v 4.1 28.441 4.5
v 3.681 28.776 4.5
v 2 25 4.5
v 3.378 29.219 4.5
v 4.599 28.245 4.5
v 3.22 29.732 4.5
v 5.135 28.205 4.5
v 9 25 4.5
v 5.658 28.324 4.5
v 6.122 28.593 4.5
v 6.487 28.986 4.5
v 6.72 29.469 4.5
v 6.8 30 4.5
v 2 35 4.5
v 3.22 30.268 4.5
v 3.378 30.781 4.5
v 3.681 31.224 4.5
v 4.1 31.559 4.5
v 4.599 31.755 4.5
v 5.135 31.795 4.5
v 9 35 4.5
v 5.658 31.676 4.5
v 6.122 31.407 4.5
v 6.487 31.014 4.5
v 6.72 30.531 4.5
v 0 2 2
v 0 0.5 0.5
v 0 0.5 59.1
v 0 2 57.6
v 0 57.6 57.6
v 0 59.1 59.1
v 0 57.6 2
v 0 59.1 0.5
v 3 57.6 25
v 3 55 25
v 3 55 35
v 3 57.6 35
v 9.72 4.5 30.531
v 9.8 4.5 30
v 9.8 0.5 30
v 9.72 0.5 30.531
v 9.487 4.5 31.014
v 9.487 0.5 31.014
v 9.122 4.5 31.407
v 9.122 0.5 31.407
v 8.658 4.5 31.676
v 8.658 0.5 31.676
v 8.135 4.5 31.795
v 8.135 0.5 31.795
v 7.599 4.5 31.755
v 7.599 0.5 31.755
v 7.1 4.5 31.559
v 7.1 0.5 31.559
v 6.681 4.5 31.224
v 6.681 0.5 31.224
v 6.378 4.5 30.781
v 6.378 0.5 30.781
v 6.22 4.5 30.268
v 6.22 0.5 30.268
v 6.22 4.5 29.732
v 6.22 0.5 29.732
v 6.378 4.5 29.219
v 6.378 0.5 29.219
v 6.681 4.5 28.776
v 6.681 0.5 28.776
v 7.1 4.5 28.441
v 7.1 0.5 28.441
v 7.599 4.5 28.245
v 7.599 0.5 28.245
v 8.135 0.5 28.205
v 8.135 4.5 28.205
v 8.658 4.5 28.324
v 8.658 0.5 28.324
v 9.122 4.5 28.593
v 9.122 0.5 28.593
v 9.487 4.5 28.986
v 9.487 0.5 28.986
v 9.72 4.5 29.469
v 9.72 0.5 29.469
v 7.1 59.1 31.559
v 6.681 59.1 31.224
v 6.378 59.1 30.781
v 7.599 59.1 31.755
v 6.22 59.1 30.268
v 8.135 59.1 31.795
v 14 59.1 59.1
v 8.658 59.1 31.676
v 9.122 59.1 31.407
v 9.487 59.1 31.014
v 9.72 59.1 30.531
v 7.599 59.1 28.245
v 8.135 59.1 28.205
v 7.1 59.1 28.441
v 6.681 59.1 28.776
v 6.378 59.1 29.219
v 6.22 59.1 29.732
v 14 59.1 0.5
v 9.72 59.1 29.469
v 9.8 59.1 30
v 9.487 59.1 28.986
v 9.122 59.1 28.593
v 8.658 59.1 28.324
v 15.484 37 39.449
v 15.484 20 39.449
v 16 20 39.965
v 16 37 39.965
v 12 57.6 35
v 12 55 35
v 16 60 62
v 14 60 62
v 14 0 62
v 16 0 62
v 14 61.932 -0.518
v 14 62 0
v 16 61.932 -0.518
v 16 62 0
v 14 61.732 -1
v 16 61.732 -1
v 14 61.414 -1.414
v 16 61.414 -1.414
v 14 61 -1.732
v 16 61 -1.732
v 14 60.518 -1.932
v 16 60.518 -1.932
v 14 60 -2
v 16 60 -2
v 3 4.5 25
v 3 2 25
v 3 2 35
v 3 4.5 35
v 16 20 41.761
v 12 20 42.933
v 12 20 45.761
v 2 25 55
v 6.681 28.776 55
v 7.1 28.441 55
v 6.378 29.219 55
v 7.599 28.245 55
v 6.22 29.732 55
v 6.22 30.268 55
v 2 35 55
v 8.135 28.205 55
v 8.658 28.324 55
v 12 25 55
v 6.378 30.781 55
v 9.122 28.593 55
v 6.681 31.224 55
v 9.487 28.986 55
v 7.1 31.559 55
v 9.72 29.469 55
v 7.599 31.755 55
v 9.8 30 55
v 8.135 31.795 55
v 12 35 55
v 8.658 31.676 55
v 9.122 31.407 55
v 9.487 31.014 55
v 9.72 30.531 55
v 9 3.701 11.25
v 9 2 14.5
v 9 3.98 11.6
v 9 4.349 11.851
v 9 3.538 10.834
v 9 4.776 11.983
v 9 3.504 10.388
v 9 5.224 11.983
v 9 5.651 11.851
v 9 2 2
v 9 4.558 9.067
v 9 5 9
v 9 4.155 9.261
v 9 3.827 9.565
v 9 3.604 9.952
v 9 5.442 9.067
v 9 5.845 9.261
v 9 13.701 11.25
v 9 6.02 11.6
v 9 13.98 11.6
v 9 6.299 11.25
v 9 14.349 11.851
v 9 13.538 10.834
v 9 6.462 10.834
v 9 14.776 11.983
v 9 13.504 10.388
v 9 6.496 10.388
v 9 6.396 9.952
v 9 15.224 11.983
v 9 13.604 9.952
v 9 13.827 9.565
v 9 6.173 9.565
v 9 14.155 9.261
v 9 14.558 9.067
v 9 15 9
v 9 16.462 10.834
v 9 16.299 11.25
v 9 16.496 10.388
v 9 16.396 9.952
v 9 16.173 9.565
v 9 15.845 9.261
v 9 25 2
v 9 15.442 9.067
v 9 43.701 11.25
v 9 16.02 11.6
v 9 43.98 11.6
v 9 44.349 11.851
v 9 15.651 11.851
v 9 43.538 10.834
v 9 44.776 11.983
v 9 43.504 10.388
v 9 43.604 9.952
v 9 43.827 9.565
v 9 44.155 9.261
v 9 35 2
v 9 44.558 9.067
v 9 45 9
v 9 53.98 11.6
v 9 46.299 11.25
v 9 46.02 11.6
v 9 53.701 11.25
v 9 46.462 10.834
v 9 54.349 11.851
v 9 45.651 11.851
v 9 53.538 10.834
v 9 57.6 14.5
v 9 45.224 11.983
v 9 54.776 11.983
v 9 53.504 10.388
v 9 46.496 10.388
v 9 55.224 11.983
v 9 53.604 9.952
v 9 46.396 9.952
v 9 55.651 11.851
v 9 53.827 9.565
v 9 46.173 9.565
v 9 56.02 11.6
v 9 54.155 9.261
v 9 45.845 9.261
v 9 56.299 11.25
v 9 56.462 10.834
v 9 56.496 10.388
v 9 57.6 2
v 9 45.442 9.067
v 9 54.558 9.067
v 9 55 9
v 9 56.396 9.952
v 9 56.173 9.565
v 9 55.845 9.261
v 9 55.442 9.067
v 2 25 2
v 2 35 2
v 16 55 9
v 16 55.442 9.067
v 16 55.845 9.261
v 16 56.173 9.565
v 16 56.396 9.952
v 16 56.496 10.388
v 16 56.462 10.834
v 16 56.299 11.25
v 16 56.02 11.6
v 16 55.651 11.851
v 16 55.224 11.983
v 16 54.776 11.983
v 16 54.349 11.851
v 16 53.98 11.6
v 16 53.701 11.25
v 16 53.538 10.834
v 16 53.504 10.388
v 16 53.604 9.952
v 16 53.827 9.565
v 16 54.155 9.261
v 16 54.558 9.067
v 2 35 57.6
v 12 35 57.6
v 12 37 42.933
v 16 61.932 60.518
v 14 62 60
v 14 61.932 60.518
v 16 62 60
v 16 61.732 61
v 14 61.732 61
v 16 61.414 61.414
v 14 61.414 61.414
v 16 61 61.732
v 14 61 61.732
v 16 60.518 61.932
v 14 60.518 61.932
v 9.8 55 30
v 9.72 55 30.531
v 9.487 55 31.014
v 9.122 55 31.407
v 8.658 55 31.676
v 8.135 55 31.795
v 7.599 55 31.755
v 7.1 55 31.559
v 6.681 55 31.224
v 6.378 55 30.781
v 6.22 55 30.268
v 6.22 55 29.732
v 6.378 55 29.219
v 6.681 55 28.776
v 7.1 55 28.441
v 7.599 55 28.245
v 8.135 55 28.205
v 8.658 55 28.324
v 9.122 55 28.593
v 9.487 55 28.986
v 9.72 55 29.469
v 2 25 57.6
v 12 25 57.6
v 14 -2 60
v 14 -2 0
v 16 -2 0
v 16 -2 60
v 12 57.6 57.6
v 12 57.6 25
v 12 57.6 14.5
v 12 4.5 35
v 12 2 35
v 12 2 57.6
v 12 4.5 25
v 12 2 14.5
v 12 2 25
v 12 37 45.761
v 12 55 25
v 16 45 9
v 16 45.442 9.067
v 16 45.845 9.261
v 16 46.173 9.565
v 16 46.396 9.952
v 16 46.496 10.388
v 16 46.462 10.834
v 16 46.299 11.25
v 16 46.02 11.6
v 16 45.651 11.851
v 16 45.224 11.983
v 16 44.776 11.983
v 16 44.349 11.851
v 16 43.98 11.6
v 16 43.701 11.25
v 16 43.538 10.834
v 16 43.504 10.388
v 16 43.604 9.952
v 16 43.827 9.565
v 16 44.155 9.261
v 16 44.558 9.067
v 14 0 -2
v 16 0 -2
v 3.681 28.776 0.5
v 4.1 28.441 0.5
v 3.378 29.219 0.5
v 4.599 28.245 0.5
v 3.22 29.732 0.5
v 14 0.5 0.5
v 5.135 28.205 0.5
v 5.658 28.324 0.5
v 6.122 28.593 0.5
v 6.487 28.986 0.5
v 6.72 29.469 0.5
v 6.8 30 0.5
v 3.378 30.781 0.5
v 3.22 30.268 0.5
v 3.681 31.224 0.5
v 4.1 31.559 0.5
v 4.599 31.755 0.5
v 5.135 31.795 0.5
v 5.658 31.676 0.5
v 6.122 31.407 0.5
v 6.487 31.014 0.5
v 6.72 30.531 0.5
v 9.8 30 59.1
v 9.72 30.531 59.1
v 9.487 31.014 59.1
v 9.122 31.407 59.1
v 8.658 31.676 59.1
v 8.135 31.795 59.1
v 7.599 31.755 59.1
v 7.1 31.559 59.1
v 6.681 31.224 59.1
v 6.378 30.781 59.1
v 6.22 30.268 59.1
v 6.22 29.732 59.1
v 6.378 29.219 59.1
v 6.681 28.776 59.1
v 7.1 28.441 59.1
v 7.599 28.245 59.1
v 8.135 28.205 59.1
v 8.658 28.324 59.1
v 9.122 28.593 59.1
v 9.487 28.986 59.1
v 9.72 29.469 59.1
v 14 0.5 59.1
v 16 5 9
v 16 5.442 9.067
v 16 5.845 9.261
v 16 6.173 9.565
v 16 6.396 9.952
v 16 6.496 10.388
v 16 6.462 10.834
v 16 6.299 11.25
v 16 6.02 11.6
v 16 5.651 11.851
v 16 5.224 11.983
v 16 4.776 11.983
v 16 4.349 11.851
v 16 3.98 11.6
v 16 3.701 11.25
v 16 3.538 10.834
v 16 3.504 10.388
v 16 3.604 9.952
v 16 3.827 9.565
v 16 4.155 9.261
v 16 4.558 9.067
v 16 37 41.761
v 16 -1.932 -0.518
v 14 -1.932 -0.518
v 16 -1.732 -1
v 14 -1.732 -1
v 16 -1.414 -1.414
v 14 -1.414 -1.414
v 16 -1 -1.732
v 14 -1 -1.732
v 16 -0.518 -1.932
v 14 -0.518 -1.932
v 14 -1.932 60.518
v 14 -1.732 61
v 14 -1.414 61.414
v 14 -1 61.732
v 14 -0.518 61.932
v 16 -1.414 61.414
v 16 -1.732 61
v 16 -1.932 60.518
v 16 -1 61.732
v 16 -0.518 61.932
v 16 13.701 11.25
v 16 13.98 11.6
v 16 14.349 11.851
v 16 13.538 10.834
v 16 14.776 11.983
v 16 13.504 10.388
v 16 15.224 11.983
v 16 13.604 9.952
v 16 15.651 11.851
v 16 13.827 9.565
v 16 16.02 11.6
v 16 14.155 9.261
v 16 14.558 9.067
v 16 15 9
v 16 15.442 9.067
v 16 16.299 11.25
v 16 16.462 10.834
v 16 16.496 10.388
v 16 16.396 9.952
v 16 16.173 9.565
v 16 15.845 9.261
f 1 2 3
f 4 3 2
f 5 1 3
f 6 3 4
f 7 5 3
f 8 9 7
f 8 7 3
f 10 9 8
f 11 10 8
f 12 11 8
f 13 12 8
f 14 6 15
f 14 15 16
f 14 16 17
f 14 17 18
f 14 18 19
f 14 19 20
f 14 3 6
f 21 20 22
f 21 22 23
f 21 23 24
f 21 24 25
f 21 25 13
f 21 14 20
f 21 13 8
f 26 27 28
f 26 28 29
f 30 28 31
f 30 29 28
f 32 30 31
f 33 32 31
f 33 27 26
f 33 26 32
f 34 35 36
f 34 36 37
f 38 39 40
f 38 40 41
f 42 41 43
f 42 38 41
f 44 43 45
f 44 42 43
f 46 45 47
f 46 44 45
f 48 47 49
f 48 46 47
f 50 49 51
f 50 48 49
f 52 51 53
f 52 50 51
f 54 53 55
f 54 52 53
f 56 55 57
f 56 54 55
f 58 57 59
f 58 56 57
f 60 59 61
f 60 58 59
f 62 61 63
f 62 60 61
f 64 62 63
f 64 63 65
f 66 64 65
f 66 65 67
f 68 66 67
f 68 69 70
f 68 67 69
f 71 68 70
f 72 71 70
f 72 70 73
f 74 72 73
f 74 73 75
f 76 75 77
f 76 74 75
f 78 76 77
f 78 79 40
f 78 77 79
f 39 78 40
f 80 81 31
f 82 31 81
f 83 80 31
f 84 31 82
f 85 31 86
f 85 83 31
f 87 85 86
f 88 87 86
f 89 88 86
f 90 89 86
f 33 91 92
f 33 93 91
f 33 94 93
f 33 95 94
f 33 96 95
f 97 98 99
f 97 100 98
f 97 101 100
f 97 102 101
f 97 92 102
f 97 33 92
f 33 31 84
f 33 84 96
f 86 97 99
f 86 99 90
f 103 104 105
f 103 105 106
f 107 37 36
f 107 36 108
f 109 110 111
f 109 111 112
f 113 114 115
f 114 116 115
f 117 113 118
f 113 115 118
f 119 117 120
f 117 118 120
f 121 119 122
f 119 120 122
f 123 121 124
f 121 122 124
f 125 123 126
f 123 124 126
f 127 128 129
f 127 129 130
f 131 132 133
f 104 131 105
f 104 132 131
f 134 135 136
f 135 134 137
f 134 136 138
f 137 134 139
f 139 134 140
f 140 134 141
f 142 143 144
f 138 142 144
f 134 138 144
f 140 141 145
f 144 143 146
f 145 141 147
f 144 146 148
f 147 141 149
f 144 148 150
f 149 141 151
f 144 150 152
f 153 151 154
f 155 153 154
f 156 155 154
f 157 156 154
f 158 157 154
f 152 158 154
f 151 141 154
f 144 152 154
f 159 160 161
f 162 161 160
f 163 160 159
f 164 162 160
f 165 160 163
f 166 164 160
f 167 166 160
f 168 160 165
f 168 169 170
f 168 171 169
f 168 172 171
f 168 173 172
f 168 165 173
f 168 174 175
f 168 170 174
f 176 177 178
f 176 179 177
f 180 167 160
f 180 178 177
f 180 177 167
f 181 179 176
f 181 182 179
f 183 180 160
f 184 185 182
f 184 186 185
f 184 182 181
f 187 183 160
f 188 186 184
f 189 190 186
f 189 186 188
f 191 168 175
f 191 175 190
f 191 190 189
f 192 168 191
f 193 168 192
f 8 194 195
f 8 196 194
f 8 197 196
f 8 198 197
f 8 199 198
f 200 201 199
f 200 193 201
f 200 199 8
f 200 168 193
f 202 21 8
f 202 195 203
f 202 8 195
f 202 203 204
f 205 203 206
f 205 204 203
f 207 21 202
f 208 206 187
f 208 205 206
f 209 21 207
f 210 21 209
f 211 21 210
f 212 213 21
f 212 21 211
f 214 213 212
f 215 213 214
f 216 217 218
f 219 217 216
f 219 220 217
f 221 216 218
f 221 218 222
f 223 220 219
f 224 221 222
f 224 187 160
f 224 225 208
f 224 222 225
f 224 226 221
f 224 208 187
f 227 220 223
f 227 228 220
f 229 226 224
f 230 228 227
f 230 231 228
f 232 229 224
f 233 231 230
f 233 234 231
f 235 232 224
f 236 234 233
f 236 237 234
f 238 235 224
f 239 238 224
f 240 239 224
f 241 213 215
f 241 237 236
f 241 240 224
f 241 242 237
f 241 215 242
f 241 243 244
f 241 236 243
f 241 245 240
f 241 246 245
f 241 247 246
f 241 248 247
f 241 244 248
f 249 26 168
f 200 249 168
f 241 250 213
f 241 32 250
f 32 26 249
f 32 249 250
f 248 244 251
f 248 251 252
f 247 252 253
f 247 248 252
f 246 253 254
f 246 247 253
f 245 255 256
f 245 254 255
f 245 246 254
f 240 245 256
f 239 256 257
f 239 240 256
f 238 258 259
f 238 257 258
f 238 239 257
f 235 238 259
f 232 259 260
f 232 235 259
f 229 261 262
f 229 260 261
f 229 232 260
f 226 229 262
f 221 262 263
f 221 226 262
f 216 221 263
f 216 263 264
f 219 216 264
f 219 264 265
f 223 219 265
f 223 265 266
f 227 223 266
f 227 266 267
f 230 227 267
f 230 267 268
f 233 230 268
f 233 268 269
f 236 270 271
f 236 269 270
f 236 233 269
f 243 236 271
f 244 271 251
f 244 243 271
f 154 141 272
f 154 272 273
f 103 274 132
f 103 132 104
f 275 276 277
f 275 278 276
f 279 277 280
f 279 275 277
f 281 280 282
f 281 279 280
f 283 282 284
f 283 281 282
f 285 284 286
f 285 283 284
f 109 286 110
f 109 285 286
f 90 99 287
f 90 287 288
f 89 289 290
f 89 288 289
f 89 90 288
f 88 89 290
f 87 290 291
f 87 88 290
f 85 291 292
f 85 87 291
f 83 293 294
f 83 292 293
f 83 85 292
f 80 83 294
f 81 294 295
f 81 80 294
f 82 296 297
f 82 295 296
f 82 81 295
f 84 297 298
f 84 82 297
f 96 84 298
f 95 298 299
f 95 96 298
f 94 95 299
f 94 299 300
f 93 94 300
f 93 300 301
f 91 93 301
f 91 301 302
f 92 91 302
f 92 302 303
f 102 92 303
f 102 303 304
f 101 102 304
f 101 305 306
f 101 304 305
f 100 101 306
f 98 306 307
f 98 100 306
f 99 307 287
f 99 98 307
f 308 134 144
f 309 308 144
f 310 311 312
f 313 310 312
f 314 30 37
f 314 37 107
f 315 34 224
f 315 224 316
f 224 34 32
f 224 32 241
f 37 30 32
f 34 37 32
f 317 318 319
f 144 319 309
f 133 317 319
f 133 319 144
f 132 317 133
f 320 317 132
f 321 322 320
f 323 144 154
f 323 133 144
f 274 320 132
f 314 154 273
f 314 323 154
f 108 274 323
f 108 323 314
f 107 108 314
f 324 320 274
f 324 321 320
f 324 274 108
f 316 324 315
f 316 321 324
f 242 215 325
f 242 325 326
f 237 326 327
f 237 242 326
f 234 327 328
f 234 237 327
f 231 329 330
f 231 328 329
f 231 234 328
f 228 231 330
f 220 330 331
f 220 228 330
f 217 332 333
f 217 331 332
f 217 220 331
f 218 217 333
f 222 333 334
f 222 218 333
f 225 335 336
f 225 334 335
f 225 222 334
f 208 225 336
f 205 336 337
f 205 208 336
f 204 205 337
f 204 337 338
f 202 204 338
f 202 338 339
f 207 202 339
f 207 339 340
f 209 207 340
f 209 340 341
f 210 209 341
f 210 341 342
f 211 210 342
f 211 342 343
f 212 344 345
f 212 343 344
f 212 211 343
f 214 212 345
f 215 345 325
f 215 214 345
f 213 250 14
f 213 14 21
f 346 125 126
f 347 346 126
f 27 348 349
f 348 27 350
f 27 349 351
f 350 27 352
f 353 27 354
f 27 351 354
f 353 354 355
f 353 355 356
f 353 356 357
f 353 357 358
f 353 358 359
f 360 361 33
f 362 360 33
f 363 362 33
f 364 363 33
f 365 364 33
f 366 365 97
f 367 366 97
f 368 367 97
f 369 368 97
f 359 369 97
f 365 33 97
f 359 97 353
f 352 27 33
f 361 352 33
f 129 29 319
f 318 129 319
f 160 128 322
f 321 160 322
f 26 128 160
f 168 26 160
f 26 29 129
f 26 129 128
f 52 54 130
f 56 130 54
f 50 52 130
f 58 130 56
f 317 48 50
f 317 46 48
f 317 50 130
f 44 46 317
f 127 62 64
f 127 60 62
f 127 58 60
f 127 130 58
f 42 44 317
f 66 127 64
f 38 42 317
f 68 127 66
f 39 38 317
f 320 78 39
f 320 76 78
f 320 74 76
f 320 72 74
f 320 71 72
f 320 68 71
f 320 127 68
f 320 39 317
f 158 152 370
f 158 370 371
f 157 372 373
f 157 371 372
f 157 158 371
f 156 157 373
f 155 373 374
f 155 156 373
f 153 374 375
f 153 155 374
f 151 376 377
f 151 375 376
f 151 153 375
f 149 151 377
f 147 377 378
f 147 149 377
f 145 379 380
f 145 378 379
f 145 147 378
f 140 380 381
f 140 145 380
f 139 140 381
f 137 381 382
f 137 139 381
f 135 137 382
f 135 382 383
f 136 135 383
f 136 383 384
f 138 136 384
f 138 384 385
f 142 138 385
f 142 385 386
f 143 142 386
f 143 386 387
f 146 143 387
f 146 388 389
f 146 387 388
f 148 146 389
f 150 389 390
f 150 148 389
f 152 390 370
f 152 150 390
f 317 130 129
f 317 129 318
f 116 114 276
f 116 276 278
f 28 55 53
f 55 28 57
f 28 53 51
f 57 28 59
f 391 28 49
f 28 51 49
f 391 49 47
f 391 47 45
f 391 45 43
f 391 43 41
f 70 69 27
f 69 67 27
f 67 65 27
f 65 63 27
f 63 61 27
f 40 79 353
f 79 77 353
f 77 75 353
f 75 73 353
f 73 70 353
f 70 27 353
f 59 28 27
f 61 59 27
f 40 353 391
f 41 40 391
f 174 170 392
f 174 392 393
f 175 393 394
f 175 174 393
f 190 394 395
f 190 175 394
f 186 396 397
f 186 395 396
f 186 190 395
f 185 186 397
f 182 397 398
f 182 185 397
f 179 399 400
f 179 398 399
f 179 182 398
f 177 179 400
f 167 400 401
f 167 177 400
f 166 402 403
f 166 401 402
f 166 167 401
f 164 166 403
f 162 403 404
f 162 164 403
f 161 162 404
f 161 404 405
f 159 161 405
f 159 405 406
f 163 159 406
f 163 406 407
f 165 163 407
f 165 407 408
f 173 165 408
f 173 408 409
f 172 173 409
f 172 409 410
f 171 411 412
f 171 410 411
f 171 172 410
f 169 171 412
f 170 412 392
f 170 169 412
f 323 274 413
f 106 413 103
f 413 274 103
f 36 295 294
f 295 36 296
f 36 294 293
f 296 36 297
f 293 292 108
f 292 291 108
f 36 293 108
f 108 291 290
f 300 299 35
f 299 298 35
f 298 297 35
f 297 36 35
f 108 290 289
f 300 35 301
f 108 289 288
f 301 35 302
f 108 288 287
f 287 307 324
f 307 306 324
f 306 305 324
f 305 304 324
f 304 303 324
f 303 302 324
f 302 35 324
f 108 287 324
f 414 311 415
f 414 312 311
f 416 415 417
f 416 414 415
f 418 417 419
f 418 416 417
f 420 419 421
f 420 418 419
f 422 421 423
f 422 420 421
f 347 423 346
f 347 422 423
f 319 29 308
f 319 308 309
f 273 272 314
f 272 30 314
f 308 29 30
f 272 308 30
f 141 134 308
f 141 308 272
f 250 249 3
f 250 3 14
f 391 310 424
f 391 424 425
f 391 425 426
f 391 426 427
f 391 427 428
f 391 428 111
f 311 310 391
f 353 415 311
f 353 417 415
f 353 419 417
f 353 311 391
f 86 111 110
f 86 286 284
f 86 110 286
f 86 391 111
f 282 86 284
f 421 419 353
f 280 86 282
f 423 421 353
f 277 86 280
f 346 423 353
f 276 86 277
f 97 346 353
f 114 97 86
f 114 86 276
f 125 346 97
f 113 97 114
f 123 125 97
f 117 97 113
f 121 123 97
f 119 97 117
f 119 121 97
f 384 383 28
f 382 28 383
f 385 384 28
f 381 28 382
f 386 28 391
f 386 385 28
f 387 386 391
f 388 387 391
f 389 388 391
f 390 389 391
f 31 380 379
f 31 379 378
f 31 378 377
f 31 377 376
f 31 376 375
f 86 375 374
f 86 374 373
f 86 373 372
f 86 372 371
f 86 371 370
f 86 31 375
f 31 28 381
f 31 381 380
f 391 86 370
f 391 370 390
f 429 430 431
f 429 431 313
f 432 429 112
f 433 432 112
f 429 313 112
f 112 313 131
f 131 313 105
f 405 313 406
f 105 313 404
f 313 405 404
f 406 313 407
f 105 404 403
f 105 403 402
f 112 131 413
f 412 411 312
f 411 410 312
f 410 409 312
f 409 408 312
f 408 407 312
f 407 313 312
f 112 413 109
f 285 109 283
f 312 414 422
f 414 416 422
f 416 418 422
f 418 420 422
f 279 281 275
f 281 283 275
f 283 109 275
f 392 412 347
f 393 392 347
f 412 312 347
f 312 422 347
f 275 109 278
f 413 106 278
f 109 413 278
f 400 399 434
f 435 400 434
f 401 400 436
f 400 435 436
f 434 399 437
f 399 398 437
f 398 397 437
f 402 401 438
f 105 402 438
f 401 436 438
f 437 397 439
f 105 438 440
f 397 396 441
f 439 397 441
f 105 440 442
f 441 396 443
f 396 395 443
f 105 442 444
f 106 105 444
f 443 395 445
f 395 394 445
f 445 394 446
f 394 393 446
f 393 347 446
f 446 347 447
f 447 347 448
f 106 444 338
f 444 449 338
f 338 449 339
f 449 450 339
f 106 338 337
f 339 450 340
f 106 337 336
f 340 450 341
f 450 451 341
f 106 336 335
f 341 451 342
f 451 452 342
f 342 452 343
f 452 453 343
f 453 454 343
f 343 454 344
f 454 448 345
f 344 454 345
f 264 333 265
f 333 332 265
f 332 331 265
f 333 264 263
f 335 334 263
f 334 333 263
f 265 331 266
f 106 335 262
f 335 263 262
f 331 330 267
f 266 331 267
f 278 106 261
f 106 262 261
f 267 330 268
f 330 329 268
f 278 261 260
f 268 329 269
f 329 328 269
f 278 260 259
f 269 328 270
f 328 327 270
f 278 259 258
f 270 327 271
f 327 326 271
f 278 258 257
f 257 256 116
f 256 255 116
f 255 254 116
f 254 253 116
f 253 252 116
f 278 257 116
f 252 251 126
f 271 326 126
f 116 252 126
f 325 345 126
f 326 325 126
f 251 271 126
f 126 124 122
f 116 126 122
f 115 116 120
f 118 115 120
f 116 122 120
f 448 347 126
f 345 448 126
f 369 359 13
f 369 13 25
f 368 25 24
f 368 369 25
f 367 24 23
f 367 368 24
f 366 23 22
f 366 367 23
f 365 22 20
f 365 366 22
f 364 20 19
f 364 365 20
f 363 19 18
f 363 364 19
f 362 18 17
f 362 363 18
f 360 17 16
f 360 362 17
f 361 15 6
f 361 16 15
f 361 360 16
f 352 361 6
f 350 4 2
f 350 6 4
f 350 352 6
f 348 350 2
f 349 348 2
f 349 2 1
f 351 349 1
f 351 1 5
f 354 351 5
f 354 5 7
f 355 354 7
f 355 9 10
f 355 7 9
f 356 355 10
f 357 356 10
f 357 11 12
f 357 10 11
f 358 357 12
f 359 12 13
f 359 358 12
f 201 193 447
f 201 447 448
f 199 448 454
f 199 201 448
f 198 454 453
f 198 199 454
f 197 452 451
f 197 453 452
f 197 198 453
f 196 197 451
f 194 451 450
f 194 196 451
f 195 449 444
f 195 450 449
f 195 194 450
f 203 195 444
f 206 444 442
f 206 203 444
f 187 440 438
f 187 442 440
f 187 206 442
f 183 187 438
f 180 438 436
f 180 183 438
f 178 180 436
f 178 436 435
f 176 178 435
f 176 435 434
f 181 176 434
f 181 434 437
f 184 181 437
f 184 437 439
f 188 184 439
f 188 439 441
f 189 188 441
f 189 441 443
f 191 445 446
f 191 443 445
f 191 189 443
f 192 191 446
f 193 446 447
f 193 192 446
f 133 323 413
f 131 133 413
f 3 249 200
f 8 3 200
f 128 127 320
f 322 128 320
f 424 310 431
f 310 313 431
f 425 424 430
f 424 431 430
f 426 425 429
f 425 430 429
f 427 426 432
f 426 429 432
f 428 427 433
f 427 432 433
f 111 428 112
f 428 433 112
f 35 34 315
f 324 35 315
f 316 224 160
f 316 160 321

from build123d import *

# Parameters (mm, degrees)
CYLINDER004_R          = 1.8
CYLINDER004_DEPTH      = 40
CYLINDER005_R          = 1.8
CYLINDER005_DEPTH      = 40
CYLINDER006_R          = 1.5
CYLINDER006_DEPTH      = 40
ARRAY002_Y_COUNT       = 2
ARRAY002_Y_PITCH       = 10
ARRAY003_Y_COUNT       = 2
ARRAY003_Y_PITCH       = 40
CYLINDER003_R          = 1.8
CYLINDER003_DEPTH      = 80
BOX010_W               = 4
BOX010_H               = 58.6
BOX010_DEPTH           = 14
BOX013_W               = 10
BOX013_H               = 10
BOX013_DEPTH           = 4
ARRAY004_Z_COUNT       = 2
ARRAY004_Z_PITCH       = 54.5
BOX014_W               = 10
BOX014_H               = 4
BOX014_DEPTH           = 10
ARRAY005_Y_COUNT       = 2
ARRAY005_Y_PITCH       = 54.5
BOX011_W               = 10
BOX011_H               = 17
BOX011_DEPTH           = 2
BOX011_PLACEMENT_ANGLE = 45
BOX009_W               = 14
BOX009_H               = 55.6
BOX009_DEPTH           = 55.6
BOX012_W               = 2
BOX012_H               = 64
BOX012_DEPTH           = 64
FILLET005_R            = 2
BOX008_W               = 14
BOX008_H               = 58.6
BOX008_DEPTH           = 58.6


with BuildPart() as vert_bottom_hole:
    # Cylinder004 → Cylinder004 (new body)
    with BuildSketch(Plane(origin=(5, 30, -12), x_dir=(1, 0, 0), z_dir=(0, 0, 1))):
        Circle(CYLINDER004_R)
    extrude(amount=CYLINDER004_DEPTH)


with BuildPart() as vert_top_hole:
    # Cylinder005 → Cylinder005 (new body)
    with BuildSketch(Plane(origin=(8, 30, 40), x_dir=(1, 0, 0), z_dir=(0, 0, 1))):
        Circle(CYLINDER005_R)
    extrude(amount=CYLINDER005_DEPTH)


with BuildPart() as wall_hole_array_array:
    # Cylinder006 → Cylinder006 (new body)
    with BuildSketch(Plane(origin=(0, 5, 10.5), x_dir=(0, 0, -1), z_dir=(1, 0, 0))):
        Circle(CYLINDER006_R)
    extrude(amount=CYLINDER006_DEPTH)

    # Array002 Y: wall hole array array ×2


with BuildPart() as wall_hole_array_array_1:
    add(wall_hole_array_array.part)
    with Locations(*[(0, i * ARRAY002_Y_PITCH, 0) for i in range(1, ARRAY002_Y_COUNT)]):
        add(wall_hole_array_array.part)

    # Array003 Y: wall hole array array ×2


with BuildPart() as wall_hole_array_array_2:
    add(wall_hole_array_array_1.part)
    with Locations(*[(0, i * ARRAY003_Y_PITCH, 0) for i in range(1, ARRAY003_Y_COUNT)]):
        add(wall_hole_array_array_1.part)


with BuildPart() as wall_hole_array_array_3:
    # Array003 placement: moved
    add(wall_hole_array_array_2.part.moved(Location((-10, 0, 0))))


with BuildPart() as around_wall_hole_fusion:
    # Cylinder003 → Cylinder003 (new body)
    with BuildSketch(Plane(origin=(8, 71, 30), x_dir=(1, 0, 0), z_dir=(0, -1, 0))):
        Circle(CYLINDER003_R)
    extrude(amount=CYLINDER003_DEPTH)

    # Fusion005: union vert bottom hole, vert top hole, wall hole array array
    add(vert_bottom_hole.part)
    add(vert_top_hole.part)
    add(wall_hole_array_array_3.part)


with BuildPart() as bottom_addition:
    # Box010 → Box010 (new body)
    with BuildSketch(Plane(origin=(9, 0.5, 0.5), x_dir=(1, 0, 0), z_dir=(0, 0, 1))):
        with Locations((2, 29.3)):
            Rectangle(BOX010_W, BOX010_H)
    extrude(amount=BOX010_DEPTH)


with BuildPart() as enf_array:
    # Box013 → Box013 (new body)
    with BuildSketch(Plane(origin=(2, 25, 0.5), x_dir=(1, 0, 0), z_dir=(0, 0, 1))):
        with Locations((5, 5)):
            Rectangle(BOX013_W, BOX013_H)
    extrude(amount=BOX013_DEPTH)

    # Array004 Z: enf array ×2


with BuildPart() as enf_array_1:
    add(enf_array.part)
    with Locations(*[(0, 0, i * ARRAY004_Z_PITCH) for i in range(1, ARRAY004_Z_COUNT)]):
        add(enf_array.part)


with BuildPart() as enf_array001:
    # Box014 → Box014 (new body)
    with BuildSketch(Plane(origin=(3, 0.5, 25), x_dir=(1, 0, 0), z_dir=(0, 0, 1))):
        with Locations((5, 2)):
            Rectangle(BOX014_W, BOX014_H)
    extrude(amount=BOX014_DEPTH)

    # Array005 Y: enf array001 ×2


with BuildPart() as enf_array001_1:
    add(enf_array001.part)
    with Locations(*[(0, i * ARRAY005_Y_PITCH, 0) for i in range(1, ARRAY005_Y_COUNT)]):
        add(enf_array001.part)


with BuildPart() as camera_cable_hole:
    # Box011 → Box011 (new body)
    with BuildSketch(Plane.XY):
        with Locations((5, 8.5)):
            Rectangle(BOX011_W, BOX011_H)
    extrude(amount=BOX011_DEPTH)


with BuildPart() as camera_cable_hole_1:
    # Box011 placement: moved
    add(camera_cable_hole.part.moved(Location((8.41288, 20, 46.52))).rotate(Axis((8.41288, 20, 46.52), (0, 1, 0)), BOX011_PLACEMENT_ANGLE))


with BuildPart() as back_wall_hole_fusion:
    # Box009 → Box009 (new body)
    with BuildSketch(Plane(origin=(-2, 2, 2), x_dir=(1, 0, 0), z_dir=(0, 0, 1))):
        with Locations((7, 27.8)):
            Rectangle(BOX009_W, BOX009_H)
    extrude(amount=BOX009_DEPTH)

    # Fusion002: union camera cable hole
    add(camera_cable_hole_1.part)


with BuildPart() as back_back_wall_fillet:
    # Box012 → Box012 (new body)
    with BuildSketch(Plane(origin=(14, -2, -2), x_dir=(1, 0, 0), z_dir=(0, 0, 1))):
        with Locations((1, 32)):
            Rectangle(BOX012_W, BOX012_H)
    extrude(amount=BOX012_DEPTH)

    # Fillet005
    fillet005_edges = [back_back_wall_fillet.edges().sort_by_distance(p)[0] for p in [
        (15, -2, -2),
        (15, -2, 62),
        (15, 62, -2),
        (15, 62, 62),
    ]]
    fillet(fillet005_edges, radius=FILLET005_R)


with BuildPart() as back_wall_whole_cut:
    # Box008 → Box008 (new body)
    with BuildSketch(Plane(origin=(0, 0.5, 0.5), x_dir=(1, 0, 0), z_dir=(0, 0, 1))):
        with Locations((7, 29.3)):
            Rectangle(BOX008_W, BOX008_H)
    extrude(amount=BOX008_DEPTH)

    # Fusion004: union back back wall fillet
    add(back_back_wall_fillet.part)

    # Cut004002: cut back wall hole fusion
    add(back_wall_hole_fusion.part, mode=Mode.SUBTRACT)

    # Fusion003: union bottom addition, enf array, enf array001
    add(bottom_addition.part)
    add(enf_array_1.part)
    add(enf_array001_1.part)

    # Cut004003: cut around wall hole fusion
    add(around_wall_hole_fusion.part, mode=Mode.SUBTRACT)


solid = back_wall_whole_cut.part
